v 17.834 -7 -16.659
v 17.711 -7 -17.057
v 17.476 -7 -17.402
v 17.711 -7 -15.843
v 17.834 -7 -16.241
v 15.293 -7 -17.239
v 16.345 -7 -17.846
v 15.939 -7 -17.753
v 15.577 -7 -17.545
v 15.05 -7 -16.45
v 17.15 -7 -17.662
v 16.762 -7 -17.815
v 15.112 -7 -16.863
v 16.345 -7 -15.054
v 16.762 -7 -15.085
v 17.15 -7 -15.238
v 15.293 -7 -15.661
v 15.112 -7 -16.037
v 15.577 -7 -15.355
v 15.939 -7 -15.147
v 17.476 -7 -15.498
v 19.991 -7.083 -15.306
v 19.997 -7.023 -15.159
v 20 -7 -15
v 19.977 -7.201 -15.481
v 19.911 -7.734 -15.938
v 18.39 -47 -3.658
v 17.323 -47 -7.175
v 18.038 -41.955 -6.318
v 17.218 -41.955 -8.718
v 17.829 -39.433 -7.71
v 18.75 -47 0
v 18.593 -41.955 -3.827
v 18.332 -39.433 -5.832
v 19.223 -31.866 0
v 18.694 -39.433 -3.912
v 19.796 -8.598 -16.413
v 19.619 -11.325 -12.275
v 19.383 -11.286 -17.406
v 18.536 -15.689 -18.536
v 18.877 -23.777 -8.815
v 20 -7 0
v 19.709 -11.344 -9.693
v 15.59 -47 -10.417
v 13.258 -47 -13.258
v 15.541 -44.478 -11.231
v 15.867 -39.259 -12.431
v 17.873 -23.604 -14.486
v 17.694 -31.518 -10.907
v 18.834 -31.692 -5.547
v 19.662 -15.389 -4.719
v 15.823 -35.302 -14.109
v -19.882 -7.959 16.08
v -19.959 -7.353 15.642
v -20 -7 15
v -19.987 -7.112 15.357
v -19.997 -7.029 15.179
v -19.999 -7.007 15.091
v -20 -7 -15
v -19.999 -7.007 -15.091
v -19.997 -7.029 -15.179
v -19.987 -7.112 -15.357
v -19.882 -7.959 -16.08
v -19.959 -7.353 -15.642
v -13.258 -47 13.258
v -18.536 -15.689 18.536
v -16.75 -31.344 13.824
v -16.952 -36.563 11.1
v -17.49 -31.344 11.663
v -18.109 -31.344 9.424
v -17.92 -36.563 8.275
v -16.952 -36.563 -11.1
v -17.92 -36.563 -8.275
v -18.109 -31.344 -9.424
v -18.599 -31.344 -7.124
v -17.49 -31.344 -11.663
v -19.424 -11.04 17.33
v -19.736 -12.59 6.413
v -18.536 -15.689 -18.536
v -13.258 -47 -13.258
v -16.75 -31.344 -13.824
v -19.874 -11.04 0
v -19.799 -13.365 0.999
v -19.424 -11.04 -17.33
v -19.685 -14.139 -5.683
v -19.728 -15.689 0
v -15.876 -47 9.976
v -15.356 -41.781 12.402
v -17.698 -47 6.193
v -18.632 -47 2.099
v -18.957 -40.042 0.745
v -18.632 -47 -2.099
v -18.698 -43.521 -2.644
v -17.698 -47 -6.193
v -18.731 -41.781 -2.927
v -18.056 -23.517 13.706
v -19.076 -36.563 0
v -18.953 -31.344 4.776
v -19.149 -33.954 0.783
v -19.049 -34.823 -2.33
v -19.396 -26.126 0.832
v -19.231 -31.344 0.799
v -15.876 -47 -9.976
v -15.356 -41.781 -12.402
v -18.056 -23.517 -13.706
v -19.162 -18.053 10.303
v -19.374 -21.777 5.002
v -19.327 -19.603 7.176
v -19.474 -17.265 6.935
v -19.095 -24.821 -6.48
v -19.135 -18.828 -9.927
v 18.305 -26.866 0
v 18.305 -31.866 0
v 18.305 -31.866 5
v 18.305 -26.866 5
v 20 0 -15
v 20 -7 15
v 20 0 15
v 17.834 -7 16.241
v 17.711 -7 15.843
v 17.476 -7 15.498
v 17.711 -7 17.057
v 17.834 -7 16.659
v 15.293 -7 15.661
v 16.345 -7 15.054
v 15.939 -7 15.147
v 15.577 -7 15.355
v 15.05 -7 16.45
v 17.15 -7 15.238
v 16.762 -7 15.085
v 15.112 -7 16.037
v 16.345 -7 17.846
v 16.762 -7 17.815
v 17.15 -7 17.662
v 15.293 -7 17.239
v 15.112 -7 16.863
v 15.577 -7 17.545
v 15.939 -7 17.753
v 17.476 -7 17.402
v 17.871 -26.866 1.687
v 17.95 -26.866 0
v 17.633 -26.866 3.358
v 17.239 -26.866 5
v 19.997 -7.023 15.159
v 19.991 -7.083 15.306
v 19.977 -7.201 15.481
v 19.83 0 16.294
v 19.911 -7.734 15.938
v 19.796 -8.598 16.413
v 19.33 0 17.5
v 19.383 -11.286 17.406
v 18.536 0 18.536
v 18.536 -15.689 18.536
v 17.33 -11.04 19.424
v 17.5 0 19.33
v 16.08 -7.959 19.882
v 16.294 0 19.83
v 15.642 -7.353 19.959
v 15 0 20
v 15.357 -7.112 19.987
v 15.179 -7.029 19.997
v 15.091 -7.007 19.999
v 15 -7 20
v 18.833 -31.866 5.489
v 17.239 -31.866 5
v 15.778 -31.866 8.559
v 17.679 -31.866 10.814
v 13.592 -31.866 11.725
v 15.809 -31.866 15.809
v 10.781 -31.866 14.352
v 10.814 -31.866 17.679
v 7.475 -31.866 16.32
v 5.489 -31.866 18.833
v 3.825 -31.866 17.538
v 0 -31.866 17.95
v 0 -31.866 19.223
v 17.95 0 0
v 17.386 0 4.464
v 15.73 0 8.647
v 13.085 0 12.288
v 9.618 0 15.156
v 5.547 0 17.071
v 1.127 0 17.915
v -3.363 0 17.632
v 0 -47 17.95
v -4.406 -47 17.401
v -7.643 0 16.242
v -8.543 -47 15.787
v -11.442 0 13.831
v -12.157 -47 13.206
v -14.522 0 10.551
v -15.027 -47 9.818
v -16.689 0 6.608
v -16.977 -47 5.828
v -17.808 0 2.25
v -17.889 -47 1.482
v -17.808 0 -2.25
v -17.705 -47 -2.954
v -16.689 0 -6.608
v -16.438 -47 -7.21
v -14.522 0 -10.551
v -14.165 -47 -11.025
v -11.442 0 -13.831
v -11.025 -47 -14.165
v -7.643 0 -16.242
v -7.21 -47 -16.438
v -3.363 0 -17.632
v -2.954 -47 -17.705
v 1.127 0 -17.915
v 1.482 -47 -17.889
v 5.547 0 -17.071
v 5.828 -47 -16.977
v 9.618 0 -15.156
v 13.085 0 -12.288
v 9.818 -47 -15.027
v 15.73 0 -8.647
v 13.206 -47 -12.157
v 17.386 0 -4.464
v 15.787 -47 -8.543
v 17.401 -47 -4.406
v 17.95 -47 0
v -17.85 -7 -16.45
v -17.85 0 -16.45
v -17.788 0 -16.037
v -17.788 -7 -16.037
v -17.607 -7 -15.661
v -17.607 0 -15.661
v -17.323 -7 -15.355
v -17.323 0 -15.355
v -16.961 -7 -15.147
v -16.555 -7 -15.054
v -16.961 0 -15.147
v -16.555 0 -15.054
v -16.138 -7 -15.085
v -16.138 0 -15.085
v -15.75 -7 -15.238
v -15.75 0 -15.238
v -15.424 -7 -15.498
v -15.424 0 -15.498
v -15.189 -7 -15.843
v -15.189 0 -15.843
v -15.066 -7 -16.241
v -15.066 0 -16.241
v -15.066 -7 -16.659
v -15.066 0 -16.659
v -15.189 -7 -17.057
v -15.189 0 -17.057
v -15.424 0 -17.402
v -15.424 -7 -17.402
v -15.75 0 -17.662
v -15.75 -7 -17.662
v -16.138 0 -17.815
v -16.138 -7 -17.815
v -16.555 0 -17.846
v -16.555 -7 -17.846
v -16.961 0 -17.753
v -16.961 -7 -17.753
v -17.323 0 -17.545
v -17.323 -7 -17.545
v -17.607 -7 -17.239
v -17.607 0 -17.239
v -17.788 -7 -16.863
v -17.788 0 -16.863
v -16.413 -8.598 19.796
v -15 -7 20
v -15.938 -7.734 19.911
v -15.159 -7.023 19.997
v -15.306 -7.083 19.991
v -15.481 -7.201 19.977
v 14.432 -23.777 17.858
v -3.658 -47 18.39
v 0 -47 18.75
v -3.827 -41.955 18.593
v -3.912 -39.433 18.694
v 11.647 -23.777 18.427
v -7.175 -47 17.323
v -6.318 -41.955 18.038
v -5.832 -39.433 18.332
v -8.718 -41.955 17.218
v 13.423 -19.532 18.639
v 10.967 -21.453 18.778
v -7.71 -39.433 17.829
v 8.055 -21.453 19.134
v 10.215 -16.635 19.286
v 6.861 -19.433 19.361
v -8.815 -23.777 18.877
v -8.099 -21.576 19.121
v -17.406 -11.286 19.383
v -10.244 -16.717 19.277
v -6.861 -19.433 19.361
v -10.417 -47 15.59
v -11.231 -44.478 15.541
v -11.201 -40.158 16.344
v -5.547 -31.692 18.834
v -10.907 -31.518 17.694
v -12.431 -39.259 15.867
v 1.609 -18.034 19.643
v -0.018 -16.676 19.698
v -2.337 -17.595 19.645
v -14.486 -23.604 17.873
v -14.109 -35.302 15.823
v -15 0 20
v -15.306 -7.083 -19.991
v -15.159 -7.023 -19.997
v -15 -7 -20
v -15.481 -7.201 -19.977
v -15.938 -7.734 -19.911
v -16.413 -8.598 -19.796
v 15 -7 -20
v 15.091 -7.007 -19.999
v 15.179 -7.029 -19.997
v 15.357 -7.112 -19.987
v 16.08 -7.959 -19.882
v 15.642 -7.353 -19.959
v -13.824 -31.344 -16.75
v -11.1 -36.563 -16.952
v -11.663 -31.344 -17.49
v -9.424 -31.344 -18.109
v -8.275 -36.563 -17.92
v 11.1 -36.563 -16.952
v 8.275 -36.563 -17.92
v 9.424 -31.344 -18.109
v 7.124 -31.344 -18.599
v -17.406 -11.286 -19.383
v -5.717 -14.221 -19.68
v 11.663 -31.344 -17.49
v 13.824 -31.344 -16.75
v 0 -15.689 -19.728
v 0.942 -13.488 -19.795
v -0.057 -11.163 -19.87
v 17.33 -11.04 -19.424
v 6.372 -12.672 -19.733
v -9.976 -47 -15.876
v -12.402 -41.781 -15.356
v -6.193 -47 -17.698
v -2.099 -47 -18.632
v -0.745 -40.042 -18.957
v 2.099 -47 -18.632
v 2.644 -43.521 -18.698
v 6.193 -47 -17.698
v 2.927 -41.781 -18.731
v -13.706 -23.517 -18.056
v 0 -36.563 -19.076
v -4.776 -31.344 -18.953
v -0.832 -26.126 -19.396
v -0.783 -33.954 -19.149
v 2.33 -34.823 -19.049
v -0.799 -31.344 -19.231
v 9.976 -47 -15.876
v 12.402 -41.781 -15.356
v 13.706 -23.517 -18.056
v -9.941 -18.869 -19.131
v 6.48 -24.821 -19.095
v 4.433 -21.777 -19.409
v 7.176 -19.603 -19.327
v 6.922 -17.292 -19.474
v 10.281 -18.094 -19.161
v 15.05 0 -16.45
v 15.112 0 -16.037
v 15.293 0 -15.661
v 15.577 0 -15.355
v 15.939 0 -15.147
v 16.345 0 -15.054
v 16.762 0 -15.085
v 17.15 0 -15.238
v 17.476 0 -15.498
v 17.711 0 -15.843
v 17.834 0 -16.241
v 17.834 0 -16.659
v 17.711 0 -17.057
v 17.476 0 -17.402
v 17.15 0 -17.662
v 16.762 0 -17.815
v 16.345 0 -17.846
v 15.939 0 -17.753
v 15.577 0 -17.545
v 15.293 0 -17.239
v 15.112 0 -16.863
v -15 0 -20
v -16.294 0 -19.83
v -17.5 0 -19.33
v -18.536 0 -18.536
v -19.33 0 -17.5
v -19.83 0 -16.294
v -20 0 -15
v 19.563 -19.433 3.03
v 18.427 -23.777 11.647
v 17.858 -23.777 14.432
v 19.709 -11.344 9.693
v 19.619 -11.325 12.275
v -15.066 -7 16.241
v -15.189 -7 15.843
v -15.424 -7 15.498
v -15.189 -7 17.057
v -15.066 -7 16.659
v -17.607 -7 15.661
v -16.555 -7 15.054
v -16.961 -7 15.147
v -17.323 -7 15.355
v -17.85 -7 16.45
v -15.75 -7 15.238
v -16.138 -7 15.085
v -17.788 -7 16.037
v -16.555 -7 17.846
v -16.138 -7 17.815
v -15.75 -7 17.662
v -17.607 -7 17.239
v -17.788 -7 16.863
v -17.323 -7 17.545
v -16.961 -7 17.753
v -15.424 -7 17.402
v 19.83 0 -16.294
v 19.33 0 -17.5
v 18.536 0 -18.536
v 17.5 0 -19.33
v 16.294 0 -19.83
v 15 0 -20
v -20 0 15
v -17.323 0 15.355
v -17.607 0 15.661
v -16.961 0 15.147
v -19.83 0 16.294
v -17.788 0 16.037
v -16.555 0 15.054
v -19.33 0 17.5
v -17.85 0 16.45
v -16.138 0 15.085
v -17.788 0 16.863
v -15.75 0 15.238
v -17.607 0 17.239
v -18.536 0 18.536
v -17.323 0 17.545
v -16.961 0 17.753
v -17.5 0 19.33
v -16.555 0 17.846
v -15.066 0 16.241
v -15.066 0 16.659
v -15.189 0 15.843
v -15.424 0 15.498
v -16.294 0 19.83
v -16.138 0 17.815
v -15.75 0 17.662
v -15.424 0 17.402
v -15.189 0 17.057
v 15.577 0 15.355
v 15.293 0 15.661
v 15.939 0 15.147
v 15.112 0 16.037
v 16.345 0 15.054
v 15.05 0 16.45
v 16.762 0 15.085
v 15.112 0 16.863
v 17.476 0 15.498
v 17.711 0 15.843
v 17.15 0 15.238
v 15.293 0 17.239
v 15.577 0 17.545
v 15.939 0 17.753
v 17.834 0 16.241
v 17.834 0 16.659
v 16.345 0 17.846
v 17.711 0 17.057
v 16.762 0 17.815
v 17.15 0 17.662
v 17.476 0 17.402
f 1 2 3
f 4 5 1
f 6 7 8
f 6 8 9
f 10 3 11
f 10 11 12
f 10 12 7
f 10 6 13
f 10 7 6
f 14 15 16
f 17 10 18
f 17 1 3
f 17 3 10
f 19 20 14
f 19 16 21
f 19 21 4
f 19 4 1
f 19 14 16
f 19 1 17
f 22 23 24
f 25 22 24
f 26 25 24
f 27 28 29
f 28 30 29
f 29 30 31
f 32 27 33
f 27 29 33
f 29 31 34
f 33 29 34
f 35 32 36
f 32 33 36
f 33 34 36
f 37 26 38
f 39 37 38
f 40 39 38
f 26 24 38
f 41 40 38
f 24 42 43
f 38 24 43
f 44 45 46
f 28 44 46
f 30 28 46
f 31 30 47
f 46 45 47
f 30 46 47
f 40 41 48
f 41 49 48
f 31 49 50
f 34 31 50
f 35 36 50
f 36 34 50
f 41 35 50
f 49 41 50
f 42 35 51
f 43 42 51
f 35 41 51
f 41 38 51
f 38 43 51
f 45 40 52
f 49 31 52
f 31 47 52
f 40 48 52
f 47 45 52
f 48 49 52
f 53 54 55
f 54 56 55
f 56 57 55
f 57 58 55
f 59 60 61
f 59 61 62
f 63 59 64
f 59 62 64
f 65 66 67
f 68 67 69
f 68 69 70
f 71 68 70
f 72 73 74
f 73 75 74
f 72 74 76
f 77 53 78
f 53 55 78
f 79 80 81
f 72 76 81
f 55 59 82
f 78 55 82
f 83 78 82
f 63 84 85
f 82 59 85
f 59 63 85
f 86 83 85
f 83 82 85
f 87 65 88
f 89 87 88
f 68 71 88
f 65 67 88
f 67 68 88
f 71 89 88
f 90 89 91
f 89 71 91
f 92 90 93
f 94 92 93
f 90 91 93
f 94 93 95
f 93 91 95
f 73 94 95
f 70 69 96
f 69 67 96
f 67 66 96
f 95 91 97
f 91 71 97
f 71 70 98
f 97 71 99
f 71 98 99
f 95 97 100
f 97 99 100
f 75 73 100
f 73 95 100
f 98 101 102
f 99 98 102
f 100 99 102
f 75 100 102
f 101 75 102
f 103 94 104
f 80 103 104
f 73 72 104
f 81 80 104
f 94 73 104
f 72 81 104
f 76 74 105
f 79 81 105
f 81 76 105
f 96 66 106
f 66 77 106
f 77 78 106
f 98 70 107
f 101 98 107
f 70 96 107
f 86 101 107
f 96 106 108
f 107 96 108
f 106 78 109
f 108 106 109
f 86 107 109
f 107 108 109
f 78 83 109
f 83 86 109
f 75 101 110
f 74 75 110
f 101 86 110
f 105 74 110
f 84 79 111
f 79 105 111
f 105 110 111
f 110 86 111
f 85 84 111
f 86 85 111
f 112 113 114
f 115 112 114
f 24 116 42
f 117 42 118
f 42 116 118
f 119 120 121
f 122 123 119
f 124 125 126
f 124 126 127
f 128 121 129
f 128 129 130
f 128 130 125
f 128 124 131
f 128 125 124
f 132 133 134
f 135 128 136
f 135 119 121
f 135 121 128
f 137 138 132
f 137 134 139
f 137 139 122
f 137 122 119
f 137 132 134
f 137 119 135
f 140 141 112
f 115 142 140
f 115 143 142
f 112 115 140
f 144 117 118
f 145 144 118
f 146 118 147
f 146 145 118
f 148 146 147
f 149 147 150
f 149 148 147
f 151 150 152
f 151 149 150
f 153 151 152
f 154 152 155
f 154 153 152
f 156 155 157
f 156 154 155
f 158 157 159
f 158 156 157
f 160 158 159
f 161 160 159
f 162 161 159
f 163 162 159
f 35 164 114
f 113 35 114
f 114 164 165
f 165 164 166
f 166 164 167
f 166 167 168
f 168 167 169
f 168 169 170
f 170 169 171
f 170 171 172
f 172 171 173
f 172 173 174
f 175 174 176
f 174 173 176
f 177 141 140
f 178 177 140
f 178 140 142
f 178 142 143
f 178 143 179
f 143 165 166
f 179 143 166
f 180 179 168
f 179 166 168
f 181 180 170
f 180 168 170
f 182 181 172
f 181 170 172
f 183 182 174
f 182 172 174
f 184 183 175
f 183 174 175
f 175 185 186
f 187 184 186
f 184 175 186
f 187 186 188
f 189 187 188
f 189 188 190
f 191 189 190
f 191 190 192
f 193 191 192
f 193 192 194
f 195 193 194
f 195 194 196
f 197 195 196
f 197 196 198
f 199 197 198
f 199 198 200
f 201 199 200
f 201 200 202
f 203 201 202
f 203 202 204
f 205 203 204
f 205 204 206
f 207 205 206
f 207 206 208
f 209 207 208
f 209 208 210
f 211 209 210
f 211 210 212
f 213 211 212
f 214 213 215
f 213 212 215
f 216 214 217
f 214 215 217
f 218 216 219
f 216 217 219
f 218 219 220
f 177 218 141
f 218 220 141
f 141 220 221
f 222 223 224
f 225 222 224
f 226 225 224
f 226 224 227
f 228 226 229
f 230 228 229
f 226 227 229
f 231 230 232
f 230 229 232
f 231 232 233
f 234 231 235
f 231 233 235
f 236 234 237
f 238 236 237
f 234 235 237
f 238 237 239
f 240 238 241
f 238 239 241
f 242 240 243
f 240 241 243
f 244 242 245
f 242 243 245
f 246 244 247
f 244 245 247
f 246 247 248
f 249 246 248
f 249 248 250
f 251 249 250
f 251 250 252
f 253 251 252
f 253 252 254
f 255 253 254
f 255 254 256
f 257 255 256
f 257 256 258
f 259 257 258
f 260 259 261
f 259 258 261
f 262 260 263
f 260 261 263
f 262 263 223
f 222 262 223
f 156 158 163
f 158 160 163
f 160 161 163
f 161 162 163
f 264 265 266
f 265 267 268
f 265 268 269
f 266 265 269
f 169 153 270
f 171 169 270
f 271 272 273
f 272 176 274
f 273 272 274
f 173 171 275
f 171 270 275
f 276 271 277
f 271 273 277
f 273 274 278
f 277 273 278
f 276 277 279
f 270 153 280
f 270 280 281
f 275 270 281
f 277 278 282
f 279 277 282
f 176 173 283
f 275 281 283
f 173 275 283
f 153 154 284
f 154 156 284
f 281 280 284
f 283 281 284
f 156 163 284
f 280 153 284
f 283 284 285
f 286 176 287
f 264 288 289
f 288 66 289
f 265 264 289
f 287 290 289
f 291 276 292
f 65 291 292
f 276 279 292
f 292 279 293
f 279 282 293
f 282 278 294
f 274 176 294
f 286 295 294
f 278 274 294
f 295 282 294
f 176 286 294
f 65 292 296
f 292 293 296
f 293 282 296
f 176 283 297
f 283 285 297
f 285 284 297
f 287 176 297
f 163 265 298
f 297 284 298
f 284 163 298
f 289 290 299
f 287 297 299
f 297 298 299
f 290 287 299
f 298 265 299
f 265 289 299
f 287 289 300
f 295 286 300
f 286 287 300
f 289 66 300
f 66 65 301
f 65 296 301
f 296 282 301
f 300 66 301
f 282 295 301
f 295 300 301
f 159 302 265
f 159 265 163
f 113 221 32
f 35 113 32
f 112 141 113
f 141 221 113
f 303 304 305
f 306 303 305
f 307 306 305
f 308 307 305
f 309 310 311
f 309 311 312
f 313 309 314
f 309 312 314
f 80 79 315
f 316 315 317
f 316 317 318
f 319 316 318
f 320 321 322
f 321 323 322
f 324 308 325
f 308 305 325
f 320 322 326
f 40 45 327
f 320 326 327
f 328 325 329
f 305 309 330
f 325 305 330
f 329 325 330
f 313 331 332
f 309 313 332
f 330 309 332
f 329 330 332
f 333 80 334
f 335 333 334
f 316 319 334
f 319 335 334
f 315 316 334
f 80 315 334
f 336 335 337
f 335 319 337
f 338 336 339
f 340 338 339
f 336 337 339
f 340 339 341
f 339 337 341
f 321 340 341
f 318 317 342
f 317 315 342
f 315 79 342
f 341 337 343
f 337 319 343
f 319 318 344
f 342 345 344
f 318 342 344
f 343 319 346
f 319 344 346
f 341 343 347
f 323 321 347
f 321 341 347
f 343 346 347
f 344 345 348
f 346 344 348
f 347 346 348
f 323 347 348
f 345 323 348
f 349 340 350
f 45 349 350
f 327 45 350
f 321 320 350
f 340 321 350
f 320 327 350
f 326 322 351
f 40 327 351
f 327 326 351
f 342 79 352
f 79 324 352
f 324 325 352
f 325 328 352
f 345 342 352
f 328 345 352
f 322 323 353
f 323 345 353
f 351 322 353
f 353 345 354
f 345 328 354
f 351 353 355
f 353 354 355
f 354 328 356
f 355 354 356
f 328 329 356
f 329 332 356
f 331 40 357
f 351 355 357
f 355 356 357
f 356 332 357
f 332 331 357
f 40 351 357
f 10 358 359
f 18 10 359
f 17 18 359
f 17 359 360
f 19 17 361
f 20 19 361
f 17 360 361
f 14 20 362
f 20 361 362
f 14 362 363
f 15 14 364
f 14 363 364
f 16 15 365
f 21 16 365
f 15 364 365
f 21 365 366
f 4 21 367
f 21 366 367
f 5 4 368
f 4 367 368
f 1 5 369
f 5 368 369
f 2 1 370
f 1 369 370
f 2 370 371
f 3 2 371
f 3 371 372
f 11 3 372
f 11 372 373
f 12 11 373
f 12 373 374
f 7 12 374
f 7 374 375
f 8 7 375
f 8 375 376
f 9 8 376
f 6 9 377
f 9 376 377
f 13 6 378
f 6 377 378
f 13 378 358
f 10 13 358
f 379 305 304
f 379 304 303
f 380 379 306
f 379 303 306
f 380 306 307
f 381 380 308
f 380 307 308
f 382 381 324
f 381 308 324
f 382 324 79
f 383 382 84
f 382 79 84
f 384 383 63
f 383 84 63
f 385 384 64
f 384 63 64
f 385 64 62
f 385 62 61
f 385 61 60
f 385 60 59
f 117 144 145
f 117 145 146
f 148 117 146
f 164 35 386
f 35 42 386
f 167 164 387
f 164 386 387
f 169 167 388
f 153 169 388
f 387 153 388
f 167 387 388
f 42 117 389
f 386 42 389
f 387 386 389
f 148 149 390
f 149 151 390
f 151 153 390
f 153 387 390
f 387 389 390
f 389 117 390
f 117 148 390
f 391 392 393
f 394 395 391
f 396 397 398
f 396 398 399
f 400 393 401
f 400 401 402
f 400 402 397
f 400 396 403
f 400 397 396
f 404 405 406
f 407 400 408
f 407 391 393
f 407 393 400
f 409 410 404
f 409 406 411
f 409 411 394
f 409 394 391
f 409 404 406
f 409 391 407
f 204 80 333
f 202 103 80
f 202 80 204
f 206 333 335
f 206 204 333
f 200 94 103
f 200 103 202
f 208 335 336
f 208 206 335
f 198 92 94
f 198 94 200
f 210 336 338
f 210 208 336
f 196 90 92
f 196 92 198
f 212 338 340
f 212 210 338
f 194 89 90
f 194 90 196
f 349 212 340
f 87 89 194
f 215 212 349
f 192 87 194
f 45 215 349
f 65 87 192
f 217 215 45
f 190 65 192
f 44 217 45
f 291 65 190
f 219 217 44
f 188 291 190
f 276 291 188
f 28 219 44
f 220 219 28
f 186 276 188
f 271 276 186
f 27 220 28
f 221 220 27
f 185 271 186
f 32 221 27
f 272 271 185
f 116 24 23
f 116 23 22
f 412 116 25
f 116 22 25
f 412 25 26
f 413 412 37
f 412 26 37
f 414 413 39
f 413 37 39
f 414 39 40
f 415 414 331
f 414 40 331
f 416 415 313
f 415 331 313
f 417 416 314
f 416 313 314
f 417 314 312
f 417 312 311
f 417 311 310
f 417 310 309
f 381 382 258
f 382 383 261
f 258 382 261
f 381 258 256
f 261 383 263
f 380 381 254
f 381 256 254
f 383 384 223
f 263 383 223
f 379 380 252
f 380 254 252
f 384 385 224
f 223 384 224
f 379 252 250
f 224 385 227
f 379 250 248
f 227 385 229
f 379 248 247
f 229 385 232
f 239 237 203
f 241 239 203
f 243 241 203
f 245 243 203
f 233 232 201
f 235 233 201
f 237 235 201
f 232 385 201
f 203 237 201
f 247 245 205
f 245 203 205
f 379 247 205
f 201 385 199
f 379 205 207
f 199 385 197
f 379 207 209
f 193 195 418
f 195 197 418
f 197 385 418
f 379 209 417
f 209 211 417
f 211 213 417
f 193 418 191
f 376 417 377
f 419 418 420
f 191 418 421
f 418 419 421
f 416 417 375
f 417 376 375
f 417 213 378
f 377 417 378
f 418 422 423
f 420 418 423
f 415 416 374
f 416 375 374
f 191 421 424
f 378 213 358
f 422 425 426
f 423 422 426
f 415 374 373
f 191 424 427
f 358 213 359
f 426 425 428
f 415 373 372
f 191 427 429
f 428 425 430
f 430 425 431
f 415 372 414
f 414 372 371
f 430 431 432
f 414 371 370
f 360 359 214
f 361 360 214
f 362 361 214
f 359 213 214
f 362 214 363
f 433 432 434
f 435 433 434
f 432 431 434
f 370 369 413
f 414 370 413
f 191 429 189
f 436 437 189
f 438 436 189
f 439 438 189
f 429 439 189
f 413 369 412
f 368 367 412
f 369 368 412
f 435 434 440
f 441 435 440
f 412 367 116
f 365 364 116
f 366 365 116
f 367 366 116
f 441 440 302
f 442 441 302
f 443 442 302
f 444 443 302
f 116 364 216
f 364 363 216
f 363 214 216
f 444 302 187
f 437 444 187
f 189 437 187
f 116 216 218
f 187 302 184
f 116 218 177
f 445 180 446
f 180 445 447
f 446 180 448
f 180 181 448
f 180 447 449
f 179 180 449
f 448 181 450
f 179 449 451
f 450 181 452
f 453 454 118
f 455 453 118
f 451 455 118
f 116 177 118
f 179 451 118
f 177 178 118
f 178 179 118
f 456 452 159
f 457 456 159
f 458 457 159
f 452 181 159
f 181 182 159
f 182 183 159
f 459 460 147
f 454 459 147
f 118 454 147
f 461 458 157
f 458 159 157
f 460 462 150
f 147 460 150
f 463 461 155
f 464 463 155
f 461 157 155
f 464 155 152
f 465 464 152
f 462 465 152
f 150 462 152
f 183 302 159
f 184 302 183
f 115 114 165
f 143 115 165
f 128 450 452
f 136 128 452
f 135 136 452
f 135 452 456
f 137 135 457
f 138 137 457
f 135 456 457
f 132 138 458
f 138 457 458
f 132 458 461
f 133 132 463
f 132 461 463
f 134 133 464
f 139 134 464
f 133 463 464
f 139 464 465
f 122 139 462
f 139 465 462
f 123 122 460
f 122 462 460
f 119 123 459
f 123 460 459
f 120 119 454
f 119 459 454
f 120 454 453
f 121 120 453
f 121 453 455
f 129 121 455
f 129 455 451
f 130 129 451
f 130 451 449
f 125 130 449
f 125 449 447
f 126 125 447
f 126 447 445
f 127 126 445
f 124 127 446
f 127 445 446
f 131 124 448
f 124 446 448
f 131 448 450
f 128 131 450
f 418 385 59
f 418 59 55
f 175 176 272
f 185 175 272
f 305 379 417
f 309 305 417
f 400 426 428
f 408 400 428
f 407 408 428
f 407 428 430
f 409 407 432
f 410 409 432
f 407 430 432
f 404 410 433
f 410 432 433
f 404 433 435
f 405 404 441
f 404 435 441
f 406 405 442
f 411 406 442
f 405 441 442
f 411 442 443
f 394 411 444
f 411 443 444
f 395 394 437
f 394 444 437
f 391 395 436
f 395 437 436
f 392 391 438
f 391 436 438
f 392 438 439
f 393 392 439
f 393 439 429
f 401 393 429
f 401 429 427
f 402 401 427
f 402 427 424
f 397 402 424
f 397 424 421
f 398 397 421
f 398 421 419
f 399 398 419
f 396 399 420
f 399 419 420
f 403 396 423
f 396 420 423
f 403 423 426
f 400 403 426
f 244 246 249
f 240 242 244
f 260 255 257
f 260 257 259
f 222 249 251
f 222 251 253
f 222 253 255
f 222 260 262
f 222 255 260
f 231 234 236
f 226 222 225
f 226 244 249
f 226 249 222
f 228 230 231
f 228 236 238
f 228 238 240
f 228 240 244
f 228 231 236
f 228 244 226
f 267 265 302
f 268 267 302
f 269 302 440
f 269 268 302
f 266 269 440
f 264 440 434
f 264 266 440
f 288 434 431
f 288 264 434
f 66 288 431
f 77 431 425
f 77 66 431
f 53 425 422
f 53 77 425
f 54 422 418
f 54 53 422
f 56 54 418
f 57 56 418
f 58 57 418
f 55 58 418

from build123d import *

# Parameters (mm, degrees)
F0_W      = 40
F0_H      = 40
F1_DEPTH  = 7
F3_R      = 18.75
F1_FACE_W = 40
F1_FACE_H = 40
F5_R      = 17.95
F6_DEPTH  = 47
F7_R      = 1.4
F8_DEPTH  = 7
F9_R      = 5
F11_DEPTH = 20
F13_DEPTH = 5


with BuildPart() as f1:
    # F0 (on Front) → F1 (new body)
    with BuildSketch(Plane.XZ):
        Rectangle(F0_W, F0_H)
    extrude(amount=F1_DEPTH)

    # F3 (on offset) → F4 section 0
    with BuildSketch(Plane.XZ.offset(47)):
        Circle(F3_R)
    # F1_face (on face) → F4 section 1
    with BuildSketch(Plane.XZ.offset(7)):
        Rectangle(F1_FACE_W, F1_FACE_H)
    loft()

    # F5 (on face) → F6 (cut, through all)
    with BuildSketch(Plane.XZ.offset(47)):
        Circle(F5_R)
    extrude(amount=-F6_DEPTH, mode=Mode.SUBTRACT)

    # F7 (on face) → F8 (cut, through all)
    with BuildSketch(Plane(origin=(0, 0, 0), x_dir=(-1, 0, 0), z_dir=(0, 1, 0))):
        with Locations((-16.45, 16.45)):
            Circle(F7_R)
        with Locations((16.45, 16.45)):
            Circle(F7_R)
        with Locations((-16.45, -16.45)):
            Circle(F7_R)
        with Locations((16.45, -16.45)):
            Circle(F7_R)
    extrude(amount=-F8_DEPTH, mode=Mode.SUBTRACT)

    # F9
    f9_edges = [f1.edges().sort_by_distance(p)[0] for p in [
        (20, -3.5, -20),
        (20, -3.5, 20),
        (-20, -3.5, 20),
        (-20, -3.5, -20),
    ]]
    fillet(f9_edges, radius=F9_R)

    # F10 (on face) → F11 (cut)
    with BuildSketch(Plane.XY.offset(20)):
        Polygon((0, -31.8655073643), (0, -47.008369118), (0, -48.6102327704), (19.3509273231, -48.6102327704), (19.3509273231, -31.8655073643), align=None)
    extrude(amount=-F11_DEPTH, mode=Mode.SUBTRACT)

    # F12 (on face) → F13 (cut)
    with BuildSketch(Plane.XZ.offset(31.8655073643)):
        with BuildLine():
            Line((15.9311909229, 0), (17.95, 0))
            ThreePointArc((17.95, 0), (17.7714847113, 2.5252388315), (17.2394895648, 5.0002499484))
            Line((17.2394895648, 5.0002499484), (15.9311909229, 5.0002499484))
            Line((15.9311909229, 5.0002499484), (15.9311909229, 0))
        make_face()
        with BuildLine():
            ThreePointArc((17.2394895648, 5.0002499484), (17.7714847113, 2.5252388315), (17.95, 0))
            Line((17.95, 0), (18.3052159846, 0))
            Line((18.3052159846, 0), (18.3052159846, 5.0002499484))
            Line((18.3052159846, 5.0002499484), (17.2394895648, 5.0002499484))
        make_face()
    extrude(amount=-F13_DEPTH, mode=Mode.SUBTRACT)


solid = f1.part
